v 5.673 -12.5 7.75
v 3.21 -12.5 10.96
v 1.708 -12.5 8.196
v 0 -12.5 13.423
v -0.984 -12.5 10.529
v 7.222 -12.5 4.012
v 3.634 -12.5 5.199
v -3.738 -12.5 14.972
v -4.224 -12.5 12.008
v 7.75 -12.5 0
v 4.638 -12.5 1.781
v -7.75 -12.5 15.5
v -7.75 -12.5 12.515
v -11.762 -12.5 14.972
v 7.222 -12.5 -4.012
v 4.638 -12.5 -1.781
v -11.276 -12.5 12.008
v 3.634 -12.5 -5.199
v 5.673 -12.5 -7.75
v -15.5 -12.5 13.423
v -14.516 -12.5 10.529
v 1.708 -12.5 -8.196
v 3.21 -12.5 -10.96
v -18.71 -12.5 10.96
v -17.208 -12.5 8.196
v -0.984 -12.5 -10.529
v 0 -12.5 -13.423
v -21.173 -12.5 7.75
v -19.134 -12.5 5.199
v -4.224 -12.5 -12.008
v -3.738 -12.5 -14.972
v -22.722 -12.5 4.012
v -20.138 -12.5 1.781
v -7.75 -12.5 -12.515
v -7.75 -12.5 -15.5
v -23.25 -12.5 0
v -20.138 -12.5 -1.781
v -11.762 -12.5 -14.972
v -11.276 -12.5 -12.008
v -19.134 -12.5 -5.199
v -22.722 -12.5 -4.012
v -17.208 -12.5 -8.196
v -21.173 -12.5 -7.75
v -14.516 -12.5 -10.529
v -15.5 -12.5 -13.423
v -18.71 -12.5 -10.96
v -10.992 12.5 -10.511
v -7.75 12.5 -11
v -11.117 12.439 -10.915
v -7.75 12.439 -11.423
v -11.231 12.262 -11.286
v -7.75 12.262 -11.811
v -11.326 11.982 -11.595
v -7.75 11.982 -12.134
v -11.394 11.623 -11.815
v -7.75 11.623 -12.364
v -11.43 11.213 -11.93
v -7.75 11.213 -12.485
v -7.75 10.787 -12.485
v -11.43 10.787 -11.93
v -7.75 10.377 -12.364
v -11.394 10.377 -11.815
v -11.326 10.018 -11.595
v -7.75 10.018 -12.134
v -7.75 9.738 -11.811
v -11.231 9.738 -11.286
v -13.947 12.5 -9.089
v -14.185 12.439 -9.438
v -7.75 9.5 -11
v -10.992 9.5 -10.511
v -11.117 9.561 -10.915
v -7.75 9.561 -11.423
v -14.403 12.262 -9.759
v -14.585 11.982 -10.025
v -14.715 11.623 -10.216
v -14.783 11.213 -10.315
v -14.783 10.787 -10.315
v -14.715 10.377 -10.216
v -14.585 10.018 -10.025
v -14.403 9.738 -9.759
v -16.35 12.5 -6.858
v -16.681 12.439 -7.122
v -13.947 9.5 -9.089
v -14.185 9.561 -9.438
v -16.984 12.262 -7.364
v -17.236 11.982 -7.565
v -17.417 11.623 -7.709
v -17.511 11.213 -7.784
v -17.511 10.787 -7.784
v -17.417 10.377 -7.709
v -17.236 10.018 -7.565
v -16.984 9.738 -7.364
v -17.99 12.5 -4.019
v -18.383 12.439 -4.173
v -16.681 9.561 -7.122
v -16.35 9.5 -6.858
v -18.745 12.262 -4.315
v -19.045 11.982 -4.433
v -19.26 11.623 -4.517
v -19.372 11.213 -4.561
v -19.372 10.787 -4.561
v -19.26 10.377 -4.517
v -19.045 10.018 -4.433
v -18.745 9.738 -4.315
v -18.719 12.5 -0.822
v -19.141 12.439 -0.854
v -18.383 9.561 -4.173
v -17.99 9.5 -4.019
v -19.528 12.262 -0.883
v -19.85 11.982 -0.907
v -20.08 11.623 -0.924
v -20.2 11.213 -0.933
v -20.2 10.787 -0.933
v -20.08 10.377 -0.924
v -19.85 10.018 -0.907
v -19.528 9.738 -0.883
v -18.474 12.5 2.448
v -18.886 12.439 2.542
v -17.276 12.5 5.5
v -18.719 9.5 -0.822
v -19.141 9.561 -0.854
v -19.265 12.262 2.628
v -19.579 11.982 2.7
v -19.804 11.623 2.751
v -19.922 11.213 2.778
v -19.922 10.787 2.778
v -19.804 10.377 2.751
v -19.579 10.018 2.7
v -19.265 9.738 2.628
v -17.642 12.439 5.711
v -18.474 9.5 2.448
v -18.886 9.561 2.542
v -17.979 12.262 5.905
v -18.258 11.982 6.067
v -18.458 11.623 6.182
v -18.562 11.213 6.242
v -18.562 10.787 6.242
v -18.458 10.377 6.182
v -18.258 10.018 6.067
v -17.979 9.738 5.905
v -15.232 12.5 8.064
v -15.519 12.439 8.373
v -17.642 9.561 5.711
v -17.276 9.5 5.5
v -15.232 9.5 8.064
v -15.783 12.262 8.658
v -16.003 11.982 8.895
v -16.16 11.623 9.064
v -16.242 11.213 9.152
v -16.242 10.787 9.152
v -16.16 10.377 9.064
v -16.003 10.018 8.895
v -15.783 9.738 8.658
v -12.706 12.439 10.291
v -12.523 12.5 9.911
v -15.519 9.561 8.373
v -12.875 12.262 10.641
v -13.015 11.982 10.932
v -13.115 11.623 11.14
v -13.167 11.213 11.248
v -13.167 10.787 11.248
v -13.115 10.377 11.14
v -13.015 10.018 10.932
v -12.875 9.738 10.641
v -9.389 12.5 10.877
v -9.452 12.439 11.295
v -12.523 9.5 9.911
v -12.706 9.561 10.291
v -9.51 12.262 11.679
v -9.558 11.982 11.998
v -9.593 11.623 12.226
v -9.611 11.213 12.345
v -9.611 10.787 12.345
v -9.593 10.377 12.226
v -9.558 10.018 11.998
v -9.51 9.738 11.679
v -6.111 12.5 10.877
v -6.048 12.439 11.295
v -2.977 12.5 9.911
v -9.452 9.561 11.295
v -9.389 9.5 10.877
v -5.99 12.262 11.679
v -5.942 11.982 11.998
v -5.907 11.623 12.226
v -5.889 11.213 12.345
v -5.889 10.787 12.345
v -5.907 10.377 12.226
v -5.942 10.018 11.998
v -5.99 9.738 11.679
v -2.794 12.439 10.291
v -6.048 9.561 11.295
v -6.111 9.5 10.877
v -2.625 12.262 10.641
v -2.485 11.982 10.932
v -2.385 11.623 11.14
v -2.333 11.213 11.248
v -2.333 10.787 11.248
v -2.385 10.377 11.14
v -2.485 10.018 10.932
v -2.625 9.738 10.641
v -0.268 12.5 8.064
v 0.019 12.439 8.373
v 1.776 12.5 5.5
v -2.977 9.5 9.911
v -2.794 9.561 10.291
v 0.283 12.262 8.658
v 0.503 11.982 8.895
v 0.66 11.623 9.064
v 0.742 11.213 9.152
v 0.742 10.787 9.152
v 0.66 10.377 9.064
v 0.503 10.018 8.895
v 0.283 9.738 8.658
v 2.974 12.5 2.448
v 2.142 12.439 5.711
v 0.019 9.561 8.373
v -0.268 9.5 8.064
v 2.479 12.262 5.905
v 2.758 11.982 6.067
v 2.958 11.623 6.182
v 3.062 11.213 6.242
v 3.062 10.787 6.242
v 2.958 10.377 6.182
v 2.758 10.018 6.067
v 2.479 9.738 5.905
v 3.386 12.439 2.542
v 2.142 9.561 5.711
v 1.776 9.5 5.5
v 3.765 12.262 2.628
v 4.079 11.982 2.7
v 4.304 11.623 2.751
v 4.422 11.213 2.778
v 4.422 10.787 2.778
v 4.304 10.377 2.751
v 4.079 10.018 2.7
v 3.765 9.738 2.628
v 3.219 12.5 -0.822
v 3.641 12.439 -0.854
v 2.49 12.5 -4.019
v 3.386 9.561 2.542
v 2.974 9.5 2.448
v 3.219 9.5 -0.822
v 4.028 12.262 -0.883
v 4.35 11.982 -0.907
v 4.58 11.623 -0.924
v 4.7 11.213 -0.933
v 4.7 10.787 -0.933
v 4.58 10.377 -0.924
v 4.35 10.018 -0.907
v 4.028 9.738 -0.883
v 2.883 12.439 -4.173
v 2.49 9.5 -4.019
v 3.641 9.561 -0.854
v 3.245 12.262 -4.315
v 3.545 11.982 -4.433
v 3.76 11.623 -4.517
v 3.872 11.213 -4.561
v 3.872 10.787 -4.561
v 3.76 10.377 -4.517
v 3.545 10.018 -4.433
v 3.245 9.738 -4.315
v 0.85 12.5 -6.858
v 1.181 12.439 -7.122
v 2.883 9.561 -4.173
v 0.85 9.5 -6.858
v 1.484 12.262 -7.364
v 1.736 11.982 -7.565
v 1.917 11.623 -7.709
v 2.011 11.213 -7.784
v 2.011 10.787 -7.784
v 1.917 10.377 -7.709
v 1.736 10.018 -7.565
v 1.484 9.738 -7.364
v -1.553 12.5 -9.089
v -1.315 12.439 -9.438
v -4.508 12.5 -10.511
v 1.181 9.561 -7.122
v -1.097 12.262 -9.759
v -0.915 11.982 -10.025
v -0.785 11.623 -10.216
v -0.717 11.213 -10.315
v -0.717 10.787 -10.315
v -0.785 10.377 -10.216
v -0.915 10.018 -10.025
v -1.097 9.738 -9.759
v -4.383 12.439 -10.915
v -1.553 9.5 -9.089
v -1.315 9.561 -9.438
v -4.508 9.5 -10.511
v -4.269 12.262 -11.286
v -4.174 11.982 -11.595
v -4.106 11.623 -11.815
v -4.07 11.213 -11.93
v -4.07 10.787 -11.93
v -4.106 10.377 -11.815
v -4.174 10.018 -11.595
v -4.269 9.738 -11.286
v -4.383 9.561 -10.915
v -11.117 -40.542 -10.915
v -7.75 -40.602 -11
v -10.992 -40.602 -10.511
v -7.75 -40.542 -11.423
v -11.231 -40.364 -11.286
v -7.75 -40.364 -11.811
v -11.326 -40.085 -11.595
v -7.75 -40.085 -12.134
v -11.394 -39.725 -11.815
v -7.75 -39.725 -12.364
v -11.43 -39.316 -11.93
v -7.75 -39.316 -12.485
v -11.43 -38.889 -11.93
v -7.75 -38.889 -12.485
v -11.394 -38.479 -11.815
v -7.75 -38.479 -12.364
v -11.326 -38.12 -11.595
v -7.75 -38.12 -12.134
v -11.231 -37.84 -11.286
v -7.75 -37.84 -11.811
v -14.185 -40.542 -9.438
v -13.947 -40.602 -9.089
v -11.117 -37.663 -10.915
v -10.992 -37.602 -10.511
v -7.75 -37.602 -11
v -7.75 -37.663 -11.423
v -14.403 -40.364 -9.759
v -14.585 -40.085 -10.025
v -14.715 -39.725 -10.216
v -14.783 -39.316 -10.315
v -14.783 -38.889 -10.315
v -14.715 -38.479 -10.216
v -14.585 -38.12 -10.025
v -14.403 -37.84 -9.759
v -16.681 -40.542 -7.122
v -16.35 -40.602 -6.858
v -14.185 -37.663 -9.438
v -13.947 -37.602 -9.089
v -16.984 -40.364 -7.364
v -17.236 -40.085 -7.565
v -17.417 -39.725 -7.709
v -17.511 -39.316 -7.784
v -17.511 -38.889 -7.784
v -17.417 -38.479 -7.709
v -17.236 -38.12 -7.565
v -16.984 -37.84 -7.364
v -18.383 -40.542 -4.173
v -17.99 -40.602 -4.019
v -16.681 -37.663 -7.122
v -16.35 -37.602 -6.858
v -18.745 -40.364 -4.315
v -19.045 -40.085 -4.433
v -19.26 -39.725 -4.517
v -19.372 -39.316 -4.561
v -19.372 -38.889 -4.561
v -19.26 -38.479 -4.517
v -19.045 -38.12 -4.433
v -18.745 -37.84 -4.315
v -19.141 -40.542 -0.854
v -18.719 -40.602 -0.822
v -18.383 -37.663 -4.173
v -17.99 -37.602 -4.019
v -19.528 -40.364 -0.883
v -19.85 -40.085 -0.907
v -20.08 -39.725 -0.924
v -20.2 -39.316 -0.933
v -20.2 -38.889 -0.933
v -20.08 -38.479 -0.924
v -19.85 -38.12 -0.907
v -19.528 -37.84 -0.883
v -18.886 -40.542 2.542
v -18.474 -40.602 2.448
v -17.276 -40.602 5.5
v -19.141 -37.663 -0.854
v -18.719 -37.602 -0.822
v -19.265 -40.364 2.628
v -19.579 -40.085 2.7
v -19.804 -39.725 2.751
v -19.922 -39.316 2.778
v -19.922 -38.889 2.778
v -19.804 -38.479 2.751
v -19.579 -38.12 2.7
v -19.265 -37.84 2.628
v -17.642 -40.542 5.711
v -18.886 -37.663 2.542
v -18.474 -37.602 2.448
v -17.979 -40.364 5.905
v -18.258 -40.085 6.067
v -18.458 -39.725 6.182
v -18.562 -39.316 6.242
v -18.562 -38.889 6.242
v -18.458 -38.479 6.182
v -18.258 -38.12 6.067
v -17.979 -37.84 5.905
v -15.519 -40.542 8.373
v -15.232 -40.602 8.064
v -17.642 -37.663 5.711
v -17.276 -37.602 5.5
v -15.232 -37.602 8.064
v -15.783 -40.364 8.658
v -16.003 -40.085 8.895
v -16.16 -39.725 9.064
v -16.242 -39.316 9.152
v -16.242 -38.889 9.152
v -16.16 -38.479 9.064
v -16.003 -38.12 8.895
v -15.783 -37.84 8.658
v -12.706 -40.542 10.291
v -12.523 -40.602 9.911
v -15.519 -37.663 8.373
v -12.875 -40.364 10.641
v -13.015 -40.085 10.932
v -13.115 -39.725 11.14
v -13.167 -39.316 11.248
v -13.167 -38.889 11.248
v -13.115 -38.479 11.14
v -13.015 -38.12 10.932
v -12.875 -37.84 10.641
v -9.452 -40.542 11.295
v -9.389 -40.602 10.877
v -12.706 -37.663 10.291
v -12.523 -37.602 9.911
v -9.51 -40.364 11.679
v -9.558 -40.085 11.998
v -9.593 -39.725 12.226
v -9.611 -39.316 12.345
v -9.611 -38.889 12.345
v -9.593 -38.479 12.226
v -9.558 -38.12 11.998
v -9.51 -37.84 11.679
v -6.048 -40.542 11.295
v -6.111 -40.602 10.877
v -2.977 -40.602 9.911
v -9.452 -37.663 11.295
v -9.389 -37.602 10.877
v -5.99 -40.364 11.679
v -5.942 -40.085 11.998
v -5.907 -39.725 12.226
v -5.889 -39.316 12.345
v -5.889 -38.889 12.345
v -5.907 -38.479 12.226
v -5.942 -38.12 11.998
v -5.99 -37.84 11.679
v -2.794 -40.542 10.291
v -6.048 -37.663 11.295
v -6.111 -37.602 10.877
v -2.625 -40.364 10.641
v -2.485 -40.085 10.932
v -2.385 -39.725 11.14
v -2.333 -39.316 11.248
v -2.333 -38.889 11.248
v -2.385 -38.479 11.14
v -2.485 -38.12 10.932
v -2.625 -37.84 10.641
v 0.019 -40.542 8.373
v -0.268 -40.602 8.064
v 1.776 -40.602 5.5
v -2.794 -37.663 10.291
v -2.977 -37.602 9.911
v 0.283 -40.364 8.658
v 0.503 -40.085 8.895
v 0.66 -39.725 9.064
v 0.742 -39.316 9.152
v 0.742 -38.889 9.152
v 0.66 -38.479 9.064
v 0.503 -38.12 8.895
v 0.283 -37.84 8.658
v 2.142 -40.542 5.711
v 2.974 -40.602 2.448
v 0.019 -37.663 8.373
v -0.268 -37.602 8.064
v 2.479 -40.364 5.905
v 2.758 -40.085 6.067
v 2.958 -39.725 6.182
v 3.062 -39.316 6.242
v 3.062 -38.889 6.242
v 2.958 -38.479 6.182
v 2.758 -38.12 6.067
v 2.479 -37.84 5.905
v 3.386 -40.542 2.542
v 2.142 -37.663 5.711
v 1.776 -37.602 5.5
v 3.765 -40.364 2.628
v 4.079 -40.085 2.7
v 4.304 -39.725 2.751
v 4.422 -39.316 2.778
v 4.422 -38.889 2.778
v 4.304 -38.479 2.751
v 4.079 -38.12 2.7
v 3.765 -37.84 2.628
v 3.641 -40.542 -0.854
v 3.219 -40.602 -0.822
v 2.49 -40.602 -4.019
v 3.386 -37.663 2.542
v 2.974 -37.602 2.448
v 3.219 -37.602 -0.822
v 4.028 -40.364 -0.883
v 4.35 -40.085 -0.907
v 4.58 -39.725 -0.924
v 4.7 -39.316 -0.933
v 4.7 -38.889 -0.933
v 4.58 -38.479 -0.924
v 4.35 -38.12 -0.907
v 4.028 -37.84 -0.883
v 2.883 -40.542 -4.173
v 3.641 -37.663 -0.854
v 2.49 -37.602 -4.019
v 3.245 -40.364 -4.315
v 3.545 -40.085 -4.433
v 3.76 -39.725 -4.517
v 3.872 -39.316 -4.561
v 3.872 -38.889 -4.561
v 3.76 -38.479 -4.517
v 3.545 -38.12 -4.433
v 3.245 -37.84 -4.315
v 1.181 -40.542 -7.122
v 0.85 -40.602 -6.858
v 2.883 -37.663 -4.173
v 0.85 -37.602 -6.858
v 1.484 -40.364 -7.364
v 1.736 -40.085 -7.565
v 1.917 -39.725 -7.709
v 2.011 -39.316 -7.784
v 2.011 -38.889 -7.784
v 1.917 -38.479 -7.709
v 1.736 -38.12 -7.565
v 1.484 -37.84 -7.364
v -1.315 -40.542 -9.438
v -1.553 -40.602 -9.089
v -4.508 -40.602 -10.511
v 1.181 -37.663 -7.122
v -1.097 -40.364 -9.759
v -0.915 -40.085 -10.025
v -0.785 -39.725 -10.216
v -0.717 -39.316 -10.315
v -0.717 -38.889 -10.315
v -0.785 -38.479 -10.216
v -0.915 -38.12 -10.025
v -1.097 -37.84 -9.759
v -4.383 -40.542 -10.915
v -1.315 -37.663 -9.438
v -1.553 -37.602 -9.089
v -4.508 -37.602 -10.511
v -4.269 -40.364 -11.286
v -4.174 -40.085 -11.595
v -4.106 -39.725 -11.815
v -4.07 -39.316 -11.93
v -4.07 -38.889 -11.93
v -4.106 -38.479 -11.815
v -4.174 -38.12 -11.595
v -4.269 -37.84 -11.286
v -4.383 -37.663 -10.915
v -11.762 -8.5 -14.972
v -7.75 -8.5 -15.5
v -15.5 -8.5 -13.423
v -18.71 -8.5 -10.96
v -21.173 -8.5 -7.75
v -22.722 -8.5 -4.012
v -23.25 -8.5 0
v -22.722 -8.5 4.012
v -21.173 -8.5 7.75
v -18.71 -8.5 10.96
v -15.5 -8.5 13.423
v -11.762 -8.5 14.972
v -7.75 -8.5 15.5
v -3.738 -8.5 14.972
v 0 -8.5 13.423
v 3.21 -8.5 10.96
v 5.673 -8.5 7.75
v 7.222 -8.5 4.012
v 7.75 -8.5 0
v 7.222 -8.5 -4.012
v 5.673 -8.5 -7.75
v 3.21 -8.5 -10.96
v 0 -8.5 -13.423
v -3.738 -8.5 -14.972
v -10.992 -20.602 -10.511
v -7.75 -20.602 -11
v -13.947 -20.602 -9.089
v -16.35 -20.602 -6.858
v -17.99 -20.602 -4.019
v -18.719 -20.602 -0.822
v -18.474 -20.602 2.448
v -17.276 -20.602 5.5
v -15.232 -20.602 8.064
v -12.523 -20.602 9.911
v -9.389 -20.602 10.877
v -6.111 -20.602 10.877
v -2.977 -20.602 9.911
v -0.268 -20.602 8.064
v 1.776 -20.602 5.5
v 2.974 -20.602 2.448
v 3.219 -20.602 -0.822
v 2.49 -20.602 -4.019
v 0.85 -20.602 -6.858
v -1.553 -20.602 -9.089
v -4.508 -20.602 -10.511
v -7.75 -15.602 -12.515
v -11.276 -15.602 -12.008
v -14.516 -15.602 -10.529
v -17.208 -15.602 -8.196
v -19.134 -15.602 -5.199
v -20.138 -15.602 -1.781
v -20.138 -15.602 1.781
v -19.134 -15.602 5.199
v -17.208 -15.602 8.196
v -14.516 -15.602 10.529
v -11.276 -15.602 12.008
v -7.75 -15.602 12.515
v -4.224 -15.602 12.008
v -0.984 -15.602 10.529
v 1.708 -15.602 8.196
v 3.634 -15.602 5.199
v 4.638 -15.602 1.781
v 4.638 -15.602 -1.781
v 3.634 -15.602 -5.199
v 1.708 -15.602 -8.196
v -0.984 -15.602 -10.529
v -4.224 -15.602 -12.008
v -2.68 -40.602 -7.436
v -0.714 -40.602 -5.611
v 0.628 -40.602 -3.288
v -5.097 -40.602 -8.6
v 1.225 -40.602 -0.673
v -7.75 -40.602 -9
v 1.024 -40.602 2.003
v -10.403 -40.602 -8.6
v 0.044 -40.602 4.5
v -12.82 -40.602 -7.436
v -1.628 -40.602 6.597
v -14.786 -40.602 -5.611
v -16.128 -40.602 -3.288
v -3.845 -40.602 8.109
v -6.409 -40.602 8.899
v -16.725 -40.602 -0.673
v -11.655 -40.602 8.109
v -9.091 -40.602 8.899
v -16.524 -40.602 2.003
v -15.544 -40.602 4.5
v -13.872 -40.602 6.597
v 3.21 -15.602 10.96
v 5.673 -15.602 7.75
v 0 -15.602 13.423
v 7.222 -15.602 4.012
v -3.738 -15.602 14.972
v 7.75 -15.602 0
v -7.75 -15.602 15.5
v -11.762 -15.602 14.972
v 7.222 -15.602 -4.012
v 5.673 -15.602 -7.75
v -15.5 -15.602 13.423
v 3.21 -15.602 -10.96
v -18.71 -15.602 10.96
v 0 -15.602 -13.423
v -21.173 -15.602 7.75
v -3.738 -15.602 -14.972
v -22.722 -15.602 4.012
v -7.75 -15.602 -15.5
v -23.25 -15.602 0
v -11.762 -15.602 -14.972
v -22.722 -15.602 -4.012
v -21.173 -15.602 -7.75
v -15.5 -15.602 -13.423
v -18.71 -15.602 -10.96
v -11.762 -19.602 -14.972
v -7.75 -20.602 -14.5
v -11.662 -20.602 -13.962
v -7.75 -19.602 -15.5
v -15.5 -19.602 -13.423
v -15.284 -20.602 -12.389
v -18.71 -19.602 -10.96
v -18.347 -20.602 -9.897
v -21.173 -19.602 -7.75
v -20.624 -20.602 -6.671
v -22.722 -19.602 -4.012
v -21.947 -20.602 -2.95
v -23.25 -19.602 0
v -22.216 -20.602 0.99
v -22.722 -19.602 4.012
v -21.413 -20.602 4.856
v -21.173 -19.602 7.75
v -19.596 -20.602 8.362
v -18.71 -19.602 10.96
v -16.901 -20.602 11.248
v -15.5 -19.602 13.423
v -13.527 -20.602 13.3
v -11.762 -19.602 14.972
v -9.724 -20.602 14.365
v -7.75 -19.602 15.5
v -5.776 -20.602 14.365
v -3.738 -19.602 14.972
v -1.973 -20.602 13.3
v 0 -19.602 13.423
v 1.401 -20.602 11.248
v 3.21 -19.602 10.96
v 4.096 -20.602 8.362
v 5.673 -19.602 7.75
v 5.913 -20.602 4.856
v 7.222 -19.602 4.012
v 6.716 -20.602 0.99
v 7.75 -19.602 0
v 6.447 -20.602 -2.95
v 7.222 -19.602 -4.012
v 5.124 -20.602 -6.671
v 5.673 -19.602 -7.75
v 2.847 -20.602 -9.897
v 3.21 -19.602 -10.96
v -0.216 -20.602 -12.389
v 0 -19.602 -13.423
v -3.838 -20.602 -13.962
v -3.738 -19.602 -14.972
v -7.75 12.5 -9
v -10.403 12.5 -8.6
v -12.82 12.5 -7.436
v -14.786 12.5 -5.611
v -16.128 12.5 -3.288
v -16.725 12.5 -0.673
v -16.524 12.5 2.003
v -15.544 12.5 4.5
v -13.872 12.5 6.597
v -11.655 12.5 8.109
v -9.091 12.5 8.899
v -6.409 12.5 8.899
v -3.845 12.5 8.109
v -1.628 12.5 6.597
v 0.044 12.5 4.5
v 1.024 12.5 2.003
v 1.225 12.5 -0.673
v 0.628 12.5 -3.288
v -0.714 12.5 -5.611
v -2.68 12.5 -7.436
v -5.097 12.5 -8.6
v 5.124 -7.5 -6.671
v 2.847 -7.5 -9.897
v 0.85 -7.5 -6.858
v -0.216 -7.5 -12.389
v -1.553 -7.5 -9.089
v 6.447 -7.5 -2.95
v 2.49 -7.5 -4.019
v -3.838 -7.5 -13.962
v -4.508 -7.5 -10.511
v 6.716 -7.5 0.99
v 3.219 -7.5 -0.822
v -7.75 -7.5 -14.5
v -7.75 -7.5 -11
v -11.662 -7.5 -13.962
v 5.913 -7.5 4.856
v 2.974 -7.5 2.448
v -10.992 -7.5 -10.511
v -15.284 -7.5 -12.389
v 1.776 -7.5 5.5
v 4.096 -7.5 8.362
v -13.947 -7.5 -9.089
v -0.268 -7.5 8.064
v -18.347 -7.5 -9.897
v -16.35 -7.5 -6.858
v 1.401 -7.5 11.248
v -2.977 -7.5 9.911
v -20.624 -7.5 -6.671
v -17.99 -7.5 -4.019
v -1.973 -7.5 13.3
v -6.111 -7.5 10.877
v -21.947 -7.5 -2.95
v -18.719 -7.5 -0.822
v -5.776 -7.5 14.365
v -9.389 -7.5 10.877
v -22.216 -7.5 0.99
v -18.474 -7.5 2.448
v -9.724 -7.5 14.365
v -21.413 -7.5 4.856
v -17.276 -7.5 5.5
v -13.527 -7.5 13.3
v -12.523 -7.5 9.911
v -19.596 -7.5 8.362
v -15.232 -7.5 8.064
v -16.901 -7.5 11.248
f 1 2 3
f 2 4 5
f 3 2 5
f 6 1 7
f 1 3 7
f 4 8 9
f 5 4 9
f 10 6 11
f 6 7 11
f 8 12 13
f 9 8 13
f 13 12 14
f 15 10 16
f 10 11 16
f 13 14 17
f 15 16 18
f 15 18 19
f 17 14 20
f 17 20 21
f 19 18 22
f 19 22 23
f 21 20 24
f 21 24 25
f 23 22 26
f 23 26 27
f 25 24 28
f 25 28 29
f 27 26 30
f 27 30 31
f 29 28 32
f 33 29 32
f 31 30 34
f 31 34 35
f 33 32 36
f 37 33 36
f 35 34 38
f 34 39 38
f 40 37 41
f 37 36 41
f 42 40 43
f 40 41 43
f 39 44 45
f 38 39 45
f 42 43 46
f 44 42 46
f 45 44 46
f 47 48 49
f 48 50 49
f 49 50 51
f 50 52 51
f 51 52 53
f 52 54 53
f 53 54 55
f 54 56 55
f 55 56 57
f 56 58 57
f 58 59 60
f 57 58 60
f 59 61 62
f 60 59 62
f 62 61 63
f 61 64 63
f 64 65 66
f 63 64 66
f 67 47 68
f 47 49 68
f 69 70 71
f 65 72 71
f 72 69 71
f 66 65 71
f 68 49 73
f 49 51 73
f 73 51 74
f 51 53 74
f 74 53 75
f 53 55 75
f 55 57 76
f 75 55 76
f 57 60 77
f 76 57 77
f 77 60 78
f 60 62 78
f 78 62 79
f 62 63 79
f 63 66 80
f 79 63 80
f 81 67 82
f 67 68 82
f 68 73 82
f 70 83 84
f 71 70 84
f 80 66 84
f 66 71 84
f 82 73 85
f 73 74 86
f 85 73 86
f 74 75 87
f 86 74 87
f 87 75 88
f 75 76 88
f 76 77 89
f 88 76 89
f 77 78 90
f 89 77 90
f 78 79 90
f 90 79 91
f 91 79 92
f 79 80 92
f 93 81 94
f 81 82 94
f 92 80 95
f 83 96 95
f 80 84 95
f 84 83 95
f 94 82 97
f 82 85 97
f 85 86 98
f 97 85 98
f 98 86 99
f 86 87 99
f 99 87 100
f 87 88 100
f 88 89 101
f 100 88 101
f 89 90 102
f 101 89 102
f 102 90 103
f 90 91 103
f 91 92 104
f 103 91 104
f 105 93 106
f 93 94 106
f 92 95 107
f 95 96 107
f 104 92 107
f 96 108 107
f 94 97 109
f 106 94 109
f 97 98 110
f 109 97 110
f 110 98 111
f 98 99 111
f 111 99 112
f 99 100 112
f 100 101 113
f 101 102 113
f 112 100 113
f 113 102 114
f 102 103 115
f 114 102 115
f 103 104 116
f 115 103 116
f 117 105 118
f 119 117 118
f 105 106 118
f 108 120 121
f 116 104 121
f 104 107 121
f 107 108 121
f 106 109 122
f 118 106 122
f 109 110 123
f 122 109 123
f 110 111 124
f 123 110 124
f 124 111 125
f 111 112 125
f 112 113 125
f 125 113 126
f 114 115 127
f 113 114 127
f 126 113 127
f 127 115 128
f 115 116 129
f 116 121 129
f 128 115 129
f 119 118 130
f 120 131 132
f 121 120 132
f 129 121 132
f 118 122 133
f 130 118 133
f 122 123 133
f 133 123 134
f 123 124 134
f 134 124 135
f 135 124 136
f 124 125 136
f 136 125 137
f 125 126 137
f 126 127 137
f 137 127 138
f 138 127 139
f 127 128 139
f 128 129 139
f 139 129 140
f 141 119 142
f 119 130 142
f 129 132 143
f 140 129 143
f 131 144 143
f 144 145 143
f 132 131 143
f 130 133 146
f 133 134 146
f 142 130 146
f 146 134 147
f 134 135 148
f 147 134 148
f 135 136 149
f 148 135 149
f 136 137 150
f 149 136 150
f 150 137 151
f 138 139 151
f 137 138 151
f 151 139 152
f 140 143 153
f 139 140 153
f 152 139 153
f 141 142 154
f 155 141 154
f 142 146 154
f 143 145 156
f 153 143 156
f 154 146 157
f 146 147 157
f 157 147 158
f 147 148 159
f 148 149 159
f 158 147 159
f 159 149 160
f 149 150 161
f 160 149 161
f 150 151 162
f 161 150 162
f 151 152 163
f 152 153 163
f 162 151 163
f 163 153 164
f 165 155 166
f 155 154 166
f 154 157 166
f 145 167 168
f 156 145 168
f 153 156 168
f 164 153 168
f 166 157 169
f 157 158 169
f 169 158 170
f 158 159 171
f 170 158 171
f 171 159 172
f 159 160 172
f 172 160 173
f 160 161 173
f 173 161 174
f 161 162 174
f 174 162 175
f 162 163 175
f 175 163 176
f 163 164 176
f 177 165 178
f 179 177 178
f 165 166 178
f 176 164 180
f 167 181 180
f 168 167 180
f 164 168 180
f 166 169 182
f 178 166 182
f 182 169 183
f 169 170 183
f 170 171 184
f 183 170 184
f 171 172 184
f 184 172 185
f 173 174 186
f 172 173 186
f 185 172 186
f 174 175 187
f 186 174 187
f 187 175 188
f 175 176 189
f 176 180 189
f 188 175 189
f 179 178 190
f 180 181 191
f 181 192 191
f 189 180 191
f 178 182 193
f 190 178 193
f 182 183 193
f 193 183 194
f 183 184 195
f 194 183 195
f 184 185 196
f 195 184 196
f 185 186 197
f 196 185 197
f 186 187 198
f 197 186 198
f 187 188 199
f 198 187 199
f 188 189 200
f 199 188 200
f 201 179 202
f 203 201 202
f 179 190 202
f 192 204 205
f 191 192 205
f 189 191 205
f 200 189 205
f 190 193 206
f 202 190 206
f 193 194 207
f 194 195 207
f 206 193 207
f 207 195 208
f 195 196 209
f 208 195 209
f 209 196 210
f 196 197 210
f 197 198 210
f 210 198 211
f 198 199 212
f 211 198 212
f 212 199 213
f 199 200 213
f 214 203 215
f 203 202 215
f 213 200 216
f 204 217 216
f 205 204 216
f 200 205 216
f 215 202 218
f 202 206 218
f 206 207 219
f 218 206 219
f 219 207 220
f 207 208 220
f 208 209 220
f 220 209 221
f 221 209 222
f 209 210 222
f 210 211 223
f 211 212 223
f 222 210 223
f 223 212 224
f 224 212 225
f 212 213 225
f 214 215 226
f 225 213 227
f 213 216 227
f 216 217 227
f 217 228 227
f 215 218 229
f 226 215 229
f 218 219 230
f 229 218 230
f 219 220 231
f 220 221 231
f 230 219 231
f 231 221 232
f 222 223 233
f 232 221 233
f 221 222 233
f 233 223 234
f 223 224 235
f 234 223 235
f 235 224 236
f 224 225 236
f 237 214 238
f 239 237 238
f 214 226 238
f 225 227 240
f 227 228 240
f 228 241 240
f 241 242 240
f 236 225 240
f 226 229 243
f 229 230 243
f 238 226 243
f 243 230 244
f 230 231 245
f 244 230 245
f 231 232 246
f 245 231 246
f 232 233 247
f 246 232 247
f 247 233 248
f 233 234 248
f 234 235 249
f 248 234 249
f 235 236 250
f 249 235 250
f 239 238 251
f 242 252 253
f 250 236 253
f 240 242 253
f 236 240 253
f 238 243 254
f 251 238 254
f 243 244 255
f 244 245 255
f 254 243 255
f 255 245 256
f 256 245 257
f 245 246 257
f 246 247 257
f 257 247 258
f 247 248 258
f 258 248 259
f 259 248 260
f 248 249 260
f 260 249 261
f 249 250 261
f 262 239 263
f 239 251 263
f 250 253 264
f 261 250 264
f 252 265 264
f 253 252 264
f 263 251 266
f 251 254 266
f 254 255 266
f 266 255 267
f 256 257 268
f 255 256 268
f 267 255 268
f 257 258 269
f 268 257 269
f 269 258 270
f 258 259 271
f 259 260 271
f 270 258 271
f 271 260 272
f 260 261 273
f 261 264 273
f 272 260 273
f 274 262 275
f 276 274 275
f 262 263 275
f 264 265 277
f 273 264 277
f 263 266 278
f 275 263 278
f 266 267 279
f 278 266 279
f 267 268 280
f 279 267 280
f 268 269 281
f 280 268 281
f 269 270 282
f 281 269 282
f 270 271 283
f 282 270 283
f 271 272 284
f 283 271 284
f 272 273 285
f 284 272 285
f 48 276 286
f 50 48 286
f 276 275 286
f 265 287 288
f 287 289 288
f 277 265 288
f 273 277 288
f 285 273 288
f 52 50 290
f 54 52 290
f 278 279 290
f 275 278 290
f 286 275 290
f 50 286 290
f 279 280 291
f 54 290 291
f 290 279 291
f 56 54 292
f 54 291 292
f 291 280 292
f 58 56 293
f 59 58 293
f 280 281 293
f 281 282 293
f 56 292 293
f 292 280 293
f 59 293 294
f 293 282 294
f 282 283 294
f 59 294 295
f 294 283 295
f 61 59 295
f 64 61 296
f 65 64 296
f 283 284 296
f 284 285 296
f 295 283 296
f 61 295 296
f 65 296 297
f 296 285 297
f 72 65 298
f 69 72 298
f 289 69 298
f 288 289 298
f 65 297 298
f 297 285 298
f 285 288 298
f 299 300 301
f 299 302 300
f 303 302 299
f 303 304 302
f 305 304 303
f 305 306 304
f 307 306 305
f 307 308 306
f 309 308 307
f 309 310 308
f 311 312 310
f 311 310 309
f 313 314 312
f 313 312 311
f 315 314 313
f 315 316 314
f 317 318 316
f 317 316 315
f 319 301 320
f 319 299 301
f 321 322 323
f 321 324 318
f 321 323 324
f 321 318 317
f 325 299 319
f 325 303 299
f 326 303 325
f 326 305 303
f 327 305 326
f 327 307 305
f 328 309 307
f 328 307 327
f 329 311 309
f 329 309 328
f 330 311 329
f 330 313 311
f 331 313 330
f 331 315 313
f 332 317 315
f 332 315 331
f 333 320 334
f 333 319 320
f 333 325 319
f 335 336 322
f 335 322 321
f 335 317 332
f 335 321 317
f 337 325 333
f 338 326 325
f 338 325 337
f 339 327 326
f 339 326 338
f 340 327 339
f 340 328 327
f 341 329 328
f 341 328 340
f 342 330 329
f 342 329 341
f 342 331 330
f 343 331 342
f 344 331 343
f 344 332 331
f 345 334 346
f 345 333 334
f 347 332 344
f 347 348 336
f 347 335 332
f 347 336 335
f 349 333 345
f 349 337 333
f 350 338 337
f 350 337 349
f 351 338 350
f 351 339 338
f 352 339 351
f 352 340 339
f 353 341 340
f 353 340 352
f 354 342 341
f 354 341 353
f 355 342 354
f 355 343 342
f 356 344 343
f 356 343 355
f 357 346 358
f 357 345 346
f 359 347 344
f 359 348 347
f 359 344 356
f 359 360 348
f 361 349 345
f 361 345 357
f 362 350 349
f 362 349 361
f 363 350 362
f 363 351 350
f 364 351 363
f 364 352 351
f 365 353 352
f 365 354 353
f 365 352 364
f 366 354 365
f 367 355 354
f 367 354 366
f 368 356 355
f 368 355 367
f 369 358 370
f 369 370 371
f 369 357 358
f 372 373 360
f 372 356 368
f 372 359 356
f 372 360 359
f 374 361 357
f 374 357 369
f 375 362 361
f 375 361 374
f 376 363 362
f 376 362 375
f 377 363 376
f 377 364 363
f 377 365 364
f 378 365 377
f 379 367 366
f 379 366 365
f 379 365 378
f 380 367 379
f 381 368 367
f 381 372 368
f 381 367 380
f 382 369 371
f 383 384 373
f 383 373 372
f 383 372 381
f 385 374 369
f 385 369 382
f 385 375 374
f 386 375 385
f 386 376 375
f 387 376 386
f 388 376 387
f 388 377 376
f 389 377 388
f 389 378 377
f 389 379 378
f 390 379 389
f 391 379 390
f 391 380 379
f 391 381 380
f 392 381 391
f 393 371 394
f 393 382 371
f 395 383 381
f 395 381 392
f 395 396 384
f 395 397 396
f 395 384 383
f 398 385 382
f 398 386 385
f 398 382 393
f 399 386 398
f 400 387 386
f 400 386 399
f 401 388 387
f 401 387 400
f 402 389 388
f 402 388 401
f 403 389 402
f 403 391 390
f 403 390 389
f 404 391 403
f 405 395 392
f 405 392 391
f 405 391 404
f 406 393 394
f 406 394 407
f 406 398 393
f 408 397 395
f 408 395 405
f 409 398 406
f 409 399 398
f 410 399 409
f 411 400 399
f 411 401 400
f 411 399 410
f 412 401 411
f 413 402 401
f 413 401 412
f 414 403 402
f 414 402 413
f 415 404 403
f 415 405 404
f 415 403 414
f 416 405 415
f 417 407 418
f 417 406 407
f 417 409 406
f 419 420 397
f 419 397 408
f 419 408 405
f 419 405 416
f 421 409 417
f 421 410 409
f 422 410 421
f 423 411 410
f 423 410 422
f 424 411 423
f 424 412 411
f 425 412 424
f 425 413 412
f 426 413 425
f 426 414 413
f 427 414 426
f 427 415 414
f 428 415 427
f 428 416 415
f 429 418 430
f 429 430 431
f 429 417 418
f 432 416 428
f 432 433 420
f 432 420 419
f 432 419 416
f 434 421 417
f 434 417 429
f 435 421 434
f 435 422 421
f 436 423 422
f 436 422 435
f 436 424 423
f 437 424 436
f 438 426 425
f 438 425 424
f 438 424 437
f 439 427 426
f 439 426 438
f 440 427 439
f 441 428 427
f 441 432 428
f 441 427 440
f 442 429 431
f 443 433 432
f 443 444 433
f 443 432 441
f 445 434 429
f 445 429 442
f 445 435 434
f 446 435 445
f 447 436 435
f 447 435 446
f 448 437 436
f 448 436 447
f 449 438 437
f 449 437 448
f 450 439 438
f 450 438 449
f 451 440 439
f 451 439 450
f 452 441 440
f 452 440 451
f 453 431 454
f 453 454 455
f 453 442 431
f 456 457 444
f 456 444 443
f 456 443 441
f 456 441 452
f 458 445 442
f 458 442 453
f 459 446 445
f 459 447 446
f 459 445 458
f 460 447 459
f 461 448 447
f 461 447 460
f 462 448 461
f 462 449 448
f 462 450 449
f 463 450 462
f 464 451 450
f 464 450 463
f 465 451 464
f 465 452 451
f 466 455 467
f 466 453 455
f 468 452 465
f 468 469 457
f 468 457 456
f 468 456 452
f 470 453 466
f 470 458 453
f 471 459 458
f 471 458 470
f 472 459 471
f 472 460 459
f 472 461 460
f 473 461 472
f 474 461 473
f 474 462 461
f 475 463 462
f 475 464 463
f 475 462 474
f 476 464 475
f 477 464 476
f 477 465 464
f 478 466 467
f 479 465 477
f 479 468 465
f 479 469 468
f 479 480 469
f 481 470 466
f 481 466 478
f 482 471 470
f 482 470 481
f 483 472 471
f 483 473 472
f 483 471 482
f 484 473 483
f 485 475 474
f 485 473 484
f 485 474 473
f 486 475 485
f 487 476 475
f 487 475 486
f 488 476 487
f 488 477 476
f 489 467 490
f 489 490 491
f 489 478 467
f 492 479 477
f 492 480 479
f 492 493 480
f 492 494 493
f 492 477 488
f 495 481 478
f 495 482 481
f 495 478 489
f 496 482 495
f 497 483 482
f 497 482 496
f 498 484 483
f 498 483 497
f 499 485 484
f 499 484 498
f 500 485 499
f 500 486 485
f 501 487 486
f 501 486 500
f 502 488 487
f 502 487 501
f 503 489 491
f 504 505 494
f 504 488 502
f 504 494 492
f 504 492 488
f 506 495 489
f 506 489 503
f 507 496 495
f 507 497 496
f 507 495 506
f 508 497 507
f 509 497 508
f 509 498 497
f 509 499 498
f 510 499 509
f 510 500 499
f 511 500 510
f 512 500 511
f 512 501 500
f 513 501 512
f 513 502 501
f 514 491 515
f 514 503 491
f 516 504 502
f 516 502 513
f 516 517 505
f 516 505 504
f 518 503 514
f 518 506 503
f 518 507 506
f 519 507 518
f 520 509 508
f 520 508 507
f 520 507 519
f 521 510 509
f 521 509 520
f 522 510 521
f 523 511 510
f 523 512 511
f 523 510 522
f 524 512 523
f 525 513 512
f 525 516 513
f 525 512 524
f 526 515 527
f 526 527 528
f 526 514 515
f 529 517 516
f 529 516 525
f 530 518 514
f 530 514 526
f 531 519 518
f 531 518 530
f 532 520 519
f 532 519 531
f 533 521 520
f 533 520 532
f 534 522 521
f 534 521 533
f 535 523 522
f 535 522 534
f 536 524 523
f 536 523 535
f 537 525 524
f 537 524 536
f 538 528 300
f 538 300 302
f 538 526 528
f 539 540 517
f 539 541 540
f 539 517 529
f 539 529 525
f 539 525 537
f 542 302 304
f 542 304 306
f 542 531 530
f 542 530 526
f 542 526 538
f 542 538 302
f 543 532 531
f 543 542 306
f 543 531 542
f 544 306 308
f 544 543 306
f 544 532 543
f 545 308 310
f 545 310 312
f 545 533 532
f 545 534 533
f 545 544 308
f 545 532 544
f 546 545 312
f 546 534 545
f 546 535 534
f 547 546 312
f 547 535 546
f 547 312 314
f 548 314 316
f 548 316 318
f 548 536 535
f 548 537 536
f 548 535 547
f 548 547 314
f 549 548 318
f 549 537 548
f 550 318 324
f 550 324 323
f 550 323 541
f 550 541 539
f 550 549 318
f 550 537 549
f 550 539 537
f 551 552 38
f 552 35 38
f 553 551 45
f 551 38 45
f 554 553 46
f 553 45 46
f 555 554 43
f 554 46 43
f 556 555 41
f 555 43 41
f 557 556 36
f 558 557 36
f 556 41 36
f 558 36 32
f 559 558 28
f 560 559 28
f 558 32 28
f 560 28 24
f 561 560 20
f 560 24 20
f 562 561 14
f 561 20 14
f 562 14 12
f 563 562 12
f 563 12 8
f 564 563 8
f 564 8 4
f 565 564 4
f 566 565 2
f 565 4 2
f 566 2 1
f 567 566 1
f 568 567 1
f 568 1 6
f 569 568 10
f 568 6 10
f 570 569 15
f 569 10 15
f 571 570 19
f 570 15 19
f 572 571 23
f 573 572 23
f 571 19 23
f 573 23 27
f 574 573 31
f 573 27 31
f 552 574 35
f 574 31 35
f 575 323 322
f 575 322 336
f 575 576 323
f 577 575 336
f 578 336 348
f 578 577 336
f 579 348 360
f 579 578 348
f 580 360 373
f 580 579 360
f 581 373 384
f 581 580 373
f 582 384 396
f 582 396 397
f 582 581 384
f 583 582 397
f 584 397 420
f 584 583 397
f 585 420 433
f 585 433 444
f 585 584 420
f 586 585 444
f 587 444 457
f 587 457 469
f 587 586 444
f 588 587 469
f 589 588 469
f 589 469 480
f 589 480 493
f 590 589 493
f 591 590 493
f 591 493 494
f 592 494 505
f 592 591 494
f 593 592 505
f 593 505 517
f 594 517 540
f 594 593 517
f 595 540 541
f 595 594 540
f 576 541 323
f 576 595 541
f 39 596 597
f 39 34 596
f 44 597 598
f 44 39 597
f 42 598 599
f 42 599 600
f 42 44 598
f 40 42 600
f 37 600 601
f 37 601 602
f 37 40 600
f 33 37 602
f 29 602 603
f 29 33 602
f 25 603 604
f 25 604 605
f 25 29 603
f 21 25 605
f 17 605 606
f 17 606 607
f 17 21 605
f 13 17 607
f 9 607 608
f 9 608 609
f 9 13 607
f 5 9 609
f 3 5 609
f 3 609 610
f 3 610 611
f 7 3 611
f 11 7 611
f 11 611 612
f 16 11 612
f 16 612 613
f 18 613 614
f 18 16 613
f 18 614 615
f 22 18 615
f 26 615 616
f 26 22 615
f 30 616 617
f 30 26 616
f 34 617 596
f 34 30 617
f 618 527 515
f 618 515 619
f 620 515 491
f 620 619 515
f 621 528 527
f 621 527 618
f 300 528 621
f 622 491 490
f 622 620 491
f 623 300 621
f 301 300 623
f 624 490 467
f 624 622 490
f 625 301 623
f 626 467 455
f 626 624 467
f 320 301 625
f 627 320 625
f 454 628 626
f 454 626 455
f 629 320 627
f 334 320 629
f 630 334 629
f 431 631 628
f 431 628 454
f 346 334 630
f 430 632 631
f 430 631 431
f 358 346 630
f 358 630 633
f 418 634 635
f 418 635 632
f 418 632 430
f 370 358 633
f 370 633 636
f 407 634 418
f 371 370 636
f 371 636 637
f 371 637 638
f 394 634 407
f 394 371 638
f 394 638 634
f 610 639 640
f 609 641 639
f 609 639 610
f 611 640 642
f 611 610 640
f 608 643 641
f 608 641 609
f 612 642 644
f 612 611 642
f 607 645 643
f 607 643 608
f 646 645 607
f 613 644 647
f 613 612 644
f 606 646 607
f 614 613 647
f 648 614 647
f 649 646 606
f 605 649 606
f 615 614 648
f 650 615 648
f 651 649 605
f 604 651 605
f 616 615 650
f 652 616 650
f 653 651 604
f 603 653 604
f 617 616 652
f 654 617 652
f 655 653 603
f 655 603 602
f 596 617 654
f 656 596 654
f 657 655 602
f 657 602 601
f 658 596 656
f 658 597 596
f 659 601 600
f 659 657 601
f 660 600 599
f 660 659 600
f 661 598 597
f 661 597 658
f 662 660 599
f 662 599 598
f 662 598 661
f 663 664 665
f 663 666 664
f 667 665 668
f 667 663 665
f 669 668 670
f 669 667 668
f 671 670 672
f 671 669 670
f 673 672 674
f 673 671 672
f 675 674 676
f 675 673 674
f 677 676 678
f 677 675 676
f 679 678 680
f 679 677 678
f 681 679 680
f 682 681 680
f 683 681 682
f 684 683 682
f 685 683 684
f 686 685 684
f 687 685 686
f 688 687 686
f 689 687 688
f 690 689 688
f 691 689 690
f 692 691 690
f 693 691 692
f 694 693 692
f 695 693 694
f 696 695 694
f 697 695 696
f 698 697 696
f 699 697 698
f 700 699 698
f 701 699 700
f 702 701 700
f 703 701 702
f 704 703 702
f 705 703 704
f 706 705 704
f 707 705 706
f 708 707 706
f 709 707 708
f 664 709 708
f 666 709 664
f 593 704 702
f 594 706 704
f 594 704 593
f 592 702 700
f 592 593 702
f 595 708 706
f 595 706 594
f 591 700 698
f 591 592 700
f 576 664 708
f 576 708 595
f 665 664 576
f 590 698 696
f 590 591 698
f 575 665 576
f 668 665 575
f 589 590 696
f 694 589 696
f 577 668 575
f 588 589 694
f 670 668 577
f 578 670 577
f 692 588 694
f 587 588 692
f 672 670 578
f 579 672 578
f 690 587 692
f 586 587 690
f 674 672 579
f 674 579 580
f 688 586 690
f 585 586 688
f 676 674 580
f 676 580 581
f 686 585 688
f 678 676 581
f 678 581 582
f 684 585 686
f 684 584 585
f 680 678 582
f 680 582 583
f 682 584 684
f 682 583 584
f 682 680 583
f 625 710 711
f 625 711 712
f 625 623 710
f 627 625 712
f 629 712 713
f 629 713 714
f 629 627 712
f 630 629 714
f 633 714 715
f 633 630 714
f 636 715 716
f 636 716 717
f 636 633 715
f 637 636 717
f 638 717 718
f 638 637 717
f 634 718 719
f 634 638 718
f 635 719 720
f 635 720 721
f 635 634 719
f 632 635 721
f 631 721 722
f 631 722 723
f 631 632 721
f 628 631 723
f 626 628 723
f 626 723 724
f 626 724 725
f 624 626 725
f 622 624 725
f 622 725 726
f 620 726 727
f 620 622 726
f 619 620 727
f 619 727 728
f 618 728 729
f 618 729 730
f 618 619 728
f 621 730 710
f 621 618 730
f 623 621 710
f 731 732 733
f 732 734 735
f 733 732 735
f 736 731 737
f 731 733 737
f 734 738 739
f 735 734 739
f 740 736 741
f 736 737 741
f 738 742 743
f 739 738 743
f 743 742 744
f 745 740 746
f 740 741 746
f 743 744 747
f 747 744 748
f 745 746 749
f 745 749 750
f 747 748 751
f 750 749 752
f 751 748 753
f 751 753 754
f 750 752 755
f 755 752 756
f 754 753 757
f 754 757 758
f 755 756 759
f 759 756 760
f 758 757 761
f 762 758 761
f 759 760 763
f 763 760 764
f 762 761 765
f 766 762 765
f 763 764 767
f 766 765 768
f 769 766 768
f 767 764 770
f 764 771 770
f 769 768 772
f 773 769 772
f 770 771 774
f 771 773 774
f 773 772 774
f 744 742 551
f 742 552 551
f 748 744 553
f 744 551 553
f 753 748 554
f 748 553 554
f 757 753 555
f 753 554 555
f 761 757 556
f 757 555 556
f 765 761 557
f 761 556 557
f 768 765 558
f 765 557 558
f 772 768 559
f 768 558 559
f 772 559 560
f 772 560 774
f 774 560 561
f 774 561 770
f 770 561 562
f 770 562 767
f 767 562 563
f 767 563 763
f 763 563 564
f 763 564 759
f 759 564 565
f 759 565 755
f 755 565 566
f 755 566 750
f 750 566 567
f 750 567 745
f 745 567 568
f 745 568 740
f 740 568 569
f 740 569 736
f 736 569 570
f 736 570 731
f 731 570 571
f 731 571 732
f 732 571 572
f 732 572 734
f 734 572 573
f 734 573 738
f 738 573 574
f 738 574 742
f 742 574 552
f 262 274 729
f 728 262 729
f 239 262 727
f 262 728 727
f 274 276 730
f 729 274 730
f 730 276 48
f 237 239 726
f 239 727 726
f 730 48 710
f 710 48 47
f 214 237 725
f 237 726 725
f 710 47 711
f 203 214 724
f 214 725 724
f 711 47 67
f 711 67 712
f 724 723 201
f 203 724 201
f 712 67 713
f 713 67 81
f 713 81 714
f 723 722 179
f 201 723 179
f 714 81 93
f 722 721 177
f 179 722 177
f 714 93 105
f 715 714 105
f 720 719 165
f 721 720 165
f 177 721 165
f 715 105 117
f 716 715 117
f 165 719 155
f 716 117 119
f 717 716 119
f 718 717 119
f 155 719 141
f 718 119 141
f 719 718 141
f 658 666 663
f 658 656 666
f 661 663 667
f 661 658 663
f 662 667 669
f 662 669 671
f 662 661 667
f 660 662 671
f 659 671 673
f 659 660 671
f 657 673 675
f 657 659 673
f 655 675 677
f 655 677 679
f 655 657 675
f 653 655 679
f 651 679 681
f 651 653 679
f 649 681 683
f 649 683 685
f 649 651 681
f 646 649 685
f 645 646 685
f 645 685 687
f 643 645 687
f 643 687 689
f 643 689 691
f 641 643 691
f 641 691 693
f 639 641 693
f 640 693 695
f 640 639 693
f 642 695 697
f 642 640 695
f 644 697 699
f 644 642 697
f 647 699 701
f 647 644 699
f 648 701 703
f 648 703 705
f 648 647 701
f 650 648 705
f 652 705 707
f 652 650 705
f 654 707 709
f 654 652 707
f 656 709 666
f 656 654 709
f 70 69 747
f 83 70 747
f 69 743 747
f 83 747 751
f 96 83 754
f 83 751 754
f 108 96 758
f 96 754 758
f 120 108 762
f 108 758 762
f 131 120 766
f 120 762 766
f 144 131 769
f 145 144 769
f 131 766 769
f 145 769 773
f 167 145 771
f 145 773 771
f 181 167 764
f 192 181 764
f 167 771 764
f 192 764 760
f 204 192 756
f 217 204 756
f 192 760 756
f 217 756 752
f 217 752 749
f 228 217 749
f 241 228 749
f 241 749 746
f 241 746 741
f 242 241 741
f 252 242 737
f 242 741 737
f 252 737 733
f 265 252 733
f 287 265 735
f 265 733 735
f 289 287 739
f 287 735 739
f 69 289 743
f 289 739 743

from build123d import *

# Parameters (mm, degrees)
CROQUIS1_W   = 3.515255872
CROQUIS1_H   = 1.551138095
CROQUIS1_H_2 = 1.551138096


with BuildPart() as part:
    # Croquis1 → Revolución1 (revolve)
    with BuildSketch(Plane.XY, mode=Mode.PRIVATE) as revoluci_n1_sk:
        with BuildLine():
            ThreePointArc((3.25, 12.5), (4.75, 11), (3.25, 9.5))
            Line((3.25, 9.5), (3.25, -7.5))
            Line((3.25, -7.5), (6.75, -7.5))
            Line((6.75, -7.5), (7.75, -8.5))
            Line((7.75, -8.5), (7.75, -12.5))
            Line((7.75, -12.5), (1.25, -12.5))
            Line((1.25, -12.5), (1.25, 12.5))
            Line((1.25, 12.5), (3.25, 12.5))
        make_face()
        with Locations((3.007627936, -13.275569047)):
            Rectangle(CROQUIS1_W, CROQUIS1_H)
        with Locations((3.007627936, -14.826707143)):
            Rectangle(CROQUIS1_W, CROQUIS1_H_2)
        with BuildLine():
            Line((7.75, -15.602276191), (4.765255872, -15.602276191))
            Line((4.765255872, -15.602276191), (1.25, -15.602276191))
            Line((1.25, -15.602276191), (1.25, -40.602276191))
            Line((1.25, -40.602276191), (3.25, -40.602276191))
            ThreePointArc((3.25, -40.602276191), (4.75, -39.102276191), (3.25, -37.602276191))
            Line((3.25, -37.602276191), (3.25, -20.602276191))
            Line((3.25, -20.602276191), (6.75, -20.602276191))
            Line((6.75, -20.602276191), (7.75, -19.602276191))
            Line((7.75, -19.602276191), (7.75, -15.602276191))
        make_face()
    revolve(revoluci_n1_sk.sketch.rotate(Axis((-7.75, -7.5, 0), (0, 1, 0)), 90), axis=Axis((-7.75, -7.5, 0), (0, 1, 0)))


solid = part.part
